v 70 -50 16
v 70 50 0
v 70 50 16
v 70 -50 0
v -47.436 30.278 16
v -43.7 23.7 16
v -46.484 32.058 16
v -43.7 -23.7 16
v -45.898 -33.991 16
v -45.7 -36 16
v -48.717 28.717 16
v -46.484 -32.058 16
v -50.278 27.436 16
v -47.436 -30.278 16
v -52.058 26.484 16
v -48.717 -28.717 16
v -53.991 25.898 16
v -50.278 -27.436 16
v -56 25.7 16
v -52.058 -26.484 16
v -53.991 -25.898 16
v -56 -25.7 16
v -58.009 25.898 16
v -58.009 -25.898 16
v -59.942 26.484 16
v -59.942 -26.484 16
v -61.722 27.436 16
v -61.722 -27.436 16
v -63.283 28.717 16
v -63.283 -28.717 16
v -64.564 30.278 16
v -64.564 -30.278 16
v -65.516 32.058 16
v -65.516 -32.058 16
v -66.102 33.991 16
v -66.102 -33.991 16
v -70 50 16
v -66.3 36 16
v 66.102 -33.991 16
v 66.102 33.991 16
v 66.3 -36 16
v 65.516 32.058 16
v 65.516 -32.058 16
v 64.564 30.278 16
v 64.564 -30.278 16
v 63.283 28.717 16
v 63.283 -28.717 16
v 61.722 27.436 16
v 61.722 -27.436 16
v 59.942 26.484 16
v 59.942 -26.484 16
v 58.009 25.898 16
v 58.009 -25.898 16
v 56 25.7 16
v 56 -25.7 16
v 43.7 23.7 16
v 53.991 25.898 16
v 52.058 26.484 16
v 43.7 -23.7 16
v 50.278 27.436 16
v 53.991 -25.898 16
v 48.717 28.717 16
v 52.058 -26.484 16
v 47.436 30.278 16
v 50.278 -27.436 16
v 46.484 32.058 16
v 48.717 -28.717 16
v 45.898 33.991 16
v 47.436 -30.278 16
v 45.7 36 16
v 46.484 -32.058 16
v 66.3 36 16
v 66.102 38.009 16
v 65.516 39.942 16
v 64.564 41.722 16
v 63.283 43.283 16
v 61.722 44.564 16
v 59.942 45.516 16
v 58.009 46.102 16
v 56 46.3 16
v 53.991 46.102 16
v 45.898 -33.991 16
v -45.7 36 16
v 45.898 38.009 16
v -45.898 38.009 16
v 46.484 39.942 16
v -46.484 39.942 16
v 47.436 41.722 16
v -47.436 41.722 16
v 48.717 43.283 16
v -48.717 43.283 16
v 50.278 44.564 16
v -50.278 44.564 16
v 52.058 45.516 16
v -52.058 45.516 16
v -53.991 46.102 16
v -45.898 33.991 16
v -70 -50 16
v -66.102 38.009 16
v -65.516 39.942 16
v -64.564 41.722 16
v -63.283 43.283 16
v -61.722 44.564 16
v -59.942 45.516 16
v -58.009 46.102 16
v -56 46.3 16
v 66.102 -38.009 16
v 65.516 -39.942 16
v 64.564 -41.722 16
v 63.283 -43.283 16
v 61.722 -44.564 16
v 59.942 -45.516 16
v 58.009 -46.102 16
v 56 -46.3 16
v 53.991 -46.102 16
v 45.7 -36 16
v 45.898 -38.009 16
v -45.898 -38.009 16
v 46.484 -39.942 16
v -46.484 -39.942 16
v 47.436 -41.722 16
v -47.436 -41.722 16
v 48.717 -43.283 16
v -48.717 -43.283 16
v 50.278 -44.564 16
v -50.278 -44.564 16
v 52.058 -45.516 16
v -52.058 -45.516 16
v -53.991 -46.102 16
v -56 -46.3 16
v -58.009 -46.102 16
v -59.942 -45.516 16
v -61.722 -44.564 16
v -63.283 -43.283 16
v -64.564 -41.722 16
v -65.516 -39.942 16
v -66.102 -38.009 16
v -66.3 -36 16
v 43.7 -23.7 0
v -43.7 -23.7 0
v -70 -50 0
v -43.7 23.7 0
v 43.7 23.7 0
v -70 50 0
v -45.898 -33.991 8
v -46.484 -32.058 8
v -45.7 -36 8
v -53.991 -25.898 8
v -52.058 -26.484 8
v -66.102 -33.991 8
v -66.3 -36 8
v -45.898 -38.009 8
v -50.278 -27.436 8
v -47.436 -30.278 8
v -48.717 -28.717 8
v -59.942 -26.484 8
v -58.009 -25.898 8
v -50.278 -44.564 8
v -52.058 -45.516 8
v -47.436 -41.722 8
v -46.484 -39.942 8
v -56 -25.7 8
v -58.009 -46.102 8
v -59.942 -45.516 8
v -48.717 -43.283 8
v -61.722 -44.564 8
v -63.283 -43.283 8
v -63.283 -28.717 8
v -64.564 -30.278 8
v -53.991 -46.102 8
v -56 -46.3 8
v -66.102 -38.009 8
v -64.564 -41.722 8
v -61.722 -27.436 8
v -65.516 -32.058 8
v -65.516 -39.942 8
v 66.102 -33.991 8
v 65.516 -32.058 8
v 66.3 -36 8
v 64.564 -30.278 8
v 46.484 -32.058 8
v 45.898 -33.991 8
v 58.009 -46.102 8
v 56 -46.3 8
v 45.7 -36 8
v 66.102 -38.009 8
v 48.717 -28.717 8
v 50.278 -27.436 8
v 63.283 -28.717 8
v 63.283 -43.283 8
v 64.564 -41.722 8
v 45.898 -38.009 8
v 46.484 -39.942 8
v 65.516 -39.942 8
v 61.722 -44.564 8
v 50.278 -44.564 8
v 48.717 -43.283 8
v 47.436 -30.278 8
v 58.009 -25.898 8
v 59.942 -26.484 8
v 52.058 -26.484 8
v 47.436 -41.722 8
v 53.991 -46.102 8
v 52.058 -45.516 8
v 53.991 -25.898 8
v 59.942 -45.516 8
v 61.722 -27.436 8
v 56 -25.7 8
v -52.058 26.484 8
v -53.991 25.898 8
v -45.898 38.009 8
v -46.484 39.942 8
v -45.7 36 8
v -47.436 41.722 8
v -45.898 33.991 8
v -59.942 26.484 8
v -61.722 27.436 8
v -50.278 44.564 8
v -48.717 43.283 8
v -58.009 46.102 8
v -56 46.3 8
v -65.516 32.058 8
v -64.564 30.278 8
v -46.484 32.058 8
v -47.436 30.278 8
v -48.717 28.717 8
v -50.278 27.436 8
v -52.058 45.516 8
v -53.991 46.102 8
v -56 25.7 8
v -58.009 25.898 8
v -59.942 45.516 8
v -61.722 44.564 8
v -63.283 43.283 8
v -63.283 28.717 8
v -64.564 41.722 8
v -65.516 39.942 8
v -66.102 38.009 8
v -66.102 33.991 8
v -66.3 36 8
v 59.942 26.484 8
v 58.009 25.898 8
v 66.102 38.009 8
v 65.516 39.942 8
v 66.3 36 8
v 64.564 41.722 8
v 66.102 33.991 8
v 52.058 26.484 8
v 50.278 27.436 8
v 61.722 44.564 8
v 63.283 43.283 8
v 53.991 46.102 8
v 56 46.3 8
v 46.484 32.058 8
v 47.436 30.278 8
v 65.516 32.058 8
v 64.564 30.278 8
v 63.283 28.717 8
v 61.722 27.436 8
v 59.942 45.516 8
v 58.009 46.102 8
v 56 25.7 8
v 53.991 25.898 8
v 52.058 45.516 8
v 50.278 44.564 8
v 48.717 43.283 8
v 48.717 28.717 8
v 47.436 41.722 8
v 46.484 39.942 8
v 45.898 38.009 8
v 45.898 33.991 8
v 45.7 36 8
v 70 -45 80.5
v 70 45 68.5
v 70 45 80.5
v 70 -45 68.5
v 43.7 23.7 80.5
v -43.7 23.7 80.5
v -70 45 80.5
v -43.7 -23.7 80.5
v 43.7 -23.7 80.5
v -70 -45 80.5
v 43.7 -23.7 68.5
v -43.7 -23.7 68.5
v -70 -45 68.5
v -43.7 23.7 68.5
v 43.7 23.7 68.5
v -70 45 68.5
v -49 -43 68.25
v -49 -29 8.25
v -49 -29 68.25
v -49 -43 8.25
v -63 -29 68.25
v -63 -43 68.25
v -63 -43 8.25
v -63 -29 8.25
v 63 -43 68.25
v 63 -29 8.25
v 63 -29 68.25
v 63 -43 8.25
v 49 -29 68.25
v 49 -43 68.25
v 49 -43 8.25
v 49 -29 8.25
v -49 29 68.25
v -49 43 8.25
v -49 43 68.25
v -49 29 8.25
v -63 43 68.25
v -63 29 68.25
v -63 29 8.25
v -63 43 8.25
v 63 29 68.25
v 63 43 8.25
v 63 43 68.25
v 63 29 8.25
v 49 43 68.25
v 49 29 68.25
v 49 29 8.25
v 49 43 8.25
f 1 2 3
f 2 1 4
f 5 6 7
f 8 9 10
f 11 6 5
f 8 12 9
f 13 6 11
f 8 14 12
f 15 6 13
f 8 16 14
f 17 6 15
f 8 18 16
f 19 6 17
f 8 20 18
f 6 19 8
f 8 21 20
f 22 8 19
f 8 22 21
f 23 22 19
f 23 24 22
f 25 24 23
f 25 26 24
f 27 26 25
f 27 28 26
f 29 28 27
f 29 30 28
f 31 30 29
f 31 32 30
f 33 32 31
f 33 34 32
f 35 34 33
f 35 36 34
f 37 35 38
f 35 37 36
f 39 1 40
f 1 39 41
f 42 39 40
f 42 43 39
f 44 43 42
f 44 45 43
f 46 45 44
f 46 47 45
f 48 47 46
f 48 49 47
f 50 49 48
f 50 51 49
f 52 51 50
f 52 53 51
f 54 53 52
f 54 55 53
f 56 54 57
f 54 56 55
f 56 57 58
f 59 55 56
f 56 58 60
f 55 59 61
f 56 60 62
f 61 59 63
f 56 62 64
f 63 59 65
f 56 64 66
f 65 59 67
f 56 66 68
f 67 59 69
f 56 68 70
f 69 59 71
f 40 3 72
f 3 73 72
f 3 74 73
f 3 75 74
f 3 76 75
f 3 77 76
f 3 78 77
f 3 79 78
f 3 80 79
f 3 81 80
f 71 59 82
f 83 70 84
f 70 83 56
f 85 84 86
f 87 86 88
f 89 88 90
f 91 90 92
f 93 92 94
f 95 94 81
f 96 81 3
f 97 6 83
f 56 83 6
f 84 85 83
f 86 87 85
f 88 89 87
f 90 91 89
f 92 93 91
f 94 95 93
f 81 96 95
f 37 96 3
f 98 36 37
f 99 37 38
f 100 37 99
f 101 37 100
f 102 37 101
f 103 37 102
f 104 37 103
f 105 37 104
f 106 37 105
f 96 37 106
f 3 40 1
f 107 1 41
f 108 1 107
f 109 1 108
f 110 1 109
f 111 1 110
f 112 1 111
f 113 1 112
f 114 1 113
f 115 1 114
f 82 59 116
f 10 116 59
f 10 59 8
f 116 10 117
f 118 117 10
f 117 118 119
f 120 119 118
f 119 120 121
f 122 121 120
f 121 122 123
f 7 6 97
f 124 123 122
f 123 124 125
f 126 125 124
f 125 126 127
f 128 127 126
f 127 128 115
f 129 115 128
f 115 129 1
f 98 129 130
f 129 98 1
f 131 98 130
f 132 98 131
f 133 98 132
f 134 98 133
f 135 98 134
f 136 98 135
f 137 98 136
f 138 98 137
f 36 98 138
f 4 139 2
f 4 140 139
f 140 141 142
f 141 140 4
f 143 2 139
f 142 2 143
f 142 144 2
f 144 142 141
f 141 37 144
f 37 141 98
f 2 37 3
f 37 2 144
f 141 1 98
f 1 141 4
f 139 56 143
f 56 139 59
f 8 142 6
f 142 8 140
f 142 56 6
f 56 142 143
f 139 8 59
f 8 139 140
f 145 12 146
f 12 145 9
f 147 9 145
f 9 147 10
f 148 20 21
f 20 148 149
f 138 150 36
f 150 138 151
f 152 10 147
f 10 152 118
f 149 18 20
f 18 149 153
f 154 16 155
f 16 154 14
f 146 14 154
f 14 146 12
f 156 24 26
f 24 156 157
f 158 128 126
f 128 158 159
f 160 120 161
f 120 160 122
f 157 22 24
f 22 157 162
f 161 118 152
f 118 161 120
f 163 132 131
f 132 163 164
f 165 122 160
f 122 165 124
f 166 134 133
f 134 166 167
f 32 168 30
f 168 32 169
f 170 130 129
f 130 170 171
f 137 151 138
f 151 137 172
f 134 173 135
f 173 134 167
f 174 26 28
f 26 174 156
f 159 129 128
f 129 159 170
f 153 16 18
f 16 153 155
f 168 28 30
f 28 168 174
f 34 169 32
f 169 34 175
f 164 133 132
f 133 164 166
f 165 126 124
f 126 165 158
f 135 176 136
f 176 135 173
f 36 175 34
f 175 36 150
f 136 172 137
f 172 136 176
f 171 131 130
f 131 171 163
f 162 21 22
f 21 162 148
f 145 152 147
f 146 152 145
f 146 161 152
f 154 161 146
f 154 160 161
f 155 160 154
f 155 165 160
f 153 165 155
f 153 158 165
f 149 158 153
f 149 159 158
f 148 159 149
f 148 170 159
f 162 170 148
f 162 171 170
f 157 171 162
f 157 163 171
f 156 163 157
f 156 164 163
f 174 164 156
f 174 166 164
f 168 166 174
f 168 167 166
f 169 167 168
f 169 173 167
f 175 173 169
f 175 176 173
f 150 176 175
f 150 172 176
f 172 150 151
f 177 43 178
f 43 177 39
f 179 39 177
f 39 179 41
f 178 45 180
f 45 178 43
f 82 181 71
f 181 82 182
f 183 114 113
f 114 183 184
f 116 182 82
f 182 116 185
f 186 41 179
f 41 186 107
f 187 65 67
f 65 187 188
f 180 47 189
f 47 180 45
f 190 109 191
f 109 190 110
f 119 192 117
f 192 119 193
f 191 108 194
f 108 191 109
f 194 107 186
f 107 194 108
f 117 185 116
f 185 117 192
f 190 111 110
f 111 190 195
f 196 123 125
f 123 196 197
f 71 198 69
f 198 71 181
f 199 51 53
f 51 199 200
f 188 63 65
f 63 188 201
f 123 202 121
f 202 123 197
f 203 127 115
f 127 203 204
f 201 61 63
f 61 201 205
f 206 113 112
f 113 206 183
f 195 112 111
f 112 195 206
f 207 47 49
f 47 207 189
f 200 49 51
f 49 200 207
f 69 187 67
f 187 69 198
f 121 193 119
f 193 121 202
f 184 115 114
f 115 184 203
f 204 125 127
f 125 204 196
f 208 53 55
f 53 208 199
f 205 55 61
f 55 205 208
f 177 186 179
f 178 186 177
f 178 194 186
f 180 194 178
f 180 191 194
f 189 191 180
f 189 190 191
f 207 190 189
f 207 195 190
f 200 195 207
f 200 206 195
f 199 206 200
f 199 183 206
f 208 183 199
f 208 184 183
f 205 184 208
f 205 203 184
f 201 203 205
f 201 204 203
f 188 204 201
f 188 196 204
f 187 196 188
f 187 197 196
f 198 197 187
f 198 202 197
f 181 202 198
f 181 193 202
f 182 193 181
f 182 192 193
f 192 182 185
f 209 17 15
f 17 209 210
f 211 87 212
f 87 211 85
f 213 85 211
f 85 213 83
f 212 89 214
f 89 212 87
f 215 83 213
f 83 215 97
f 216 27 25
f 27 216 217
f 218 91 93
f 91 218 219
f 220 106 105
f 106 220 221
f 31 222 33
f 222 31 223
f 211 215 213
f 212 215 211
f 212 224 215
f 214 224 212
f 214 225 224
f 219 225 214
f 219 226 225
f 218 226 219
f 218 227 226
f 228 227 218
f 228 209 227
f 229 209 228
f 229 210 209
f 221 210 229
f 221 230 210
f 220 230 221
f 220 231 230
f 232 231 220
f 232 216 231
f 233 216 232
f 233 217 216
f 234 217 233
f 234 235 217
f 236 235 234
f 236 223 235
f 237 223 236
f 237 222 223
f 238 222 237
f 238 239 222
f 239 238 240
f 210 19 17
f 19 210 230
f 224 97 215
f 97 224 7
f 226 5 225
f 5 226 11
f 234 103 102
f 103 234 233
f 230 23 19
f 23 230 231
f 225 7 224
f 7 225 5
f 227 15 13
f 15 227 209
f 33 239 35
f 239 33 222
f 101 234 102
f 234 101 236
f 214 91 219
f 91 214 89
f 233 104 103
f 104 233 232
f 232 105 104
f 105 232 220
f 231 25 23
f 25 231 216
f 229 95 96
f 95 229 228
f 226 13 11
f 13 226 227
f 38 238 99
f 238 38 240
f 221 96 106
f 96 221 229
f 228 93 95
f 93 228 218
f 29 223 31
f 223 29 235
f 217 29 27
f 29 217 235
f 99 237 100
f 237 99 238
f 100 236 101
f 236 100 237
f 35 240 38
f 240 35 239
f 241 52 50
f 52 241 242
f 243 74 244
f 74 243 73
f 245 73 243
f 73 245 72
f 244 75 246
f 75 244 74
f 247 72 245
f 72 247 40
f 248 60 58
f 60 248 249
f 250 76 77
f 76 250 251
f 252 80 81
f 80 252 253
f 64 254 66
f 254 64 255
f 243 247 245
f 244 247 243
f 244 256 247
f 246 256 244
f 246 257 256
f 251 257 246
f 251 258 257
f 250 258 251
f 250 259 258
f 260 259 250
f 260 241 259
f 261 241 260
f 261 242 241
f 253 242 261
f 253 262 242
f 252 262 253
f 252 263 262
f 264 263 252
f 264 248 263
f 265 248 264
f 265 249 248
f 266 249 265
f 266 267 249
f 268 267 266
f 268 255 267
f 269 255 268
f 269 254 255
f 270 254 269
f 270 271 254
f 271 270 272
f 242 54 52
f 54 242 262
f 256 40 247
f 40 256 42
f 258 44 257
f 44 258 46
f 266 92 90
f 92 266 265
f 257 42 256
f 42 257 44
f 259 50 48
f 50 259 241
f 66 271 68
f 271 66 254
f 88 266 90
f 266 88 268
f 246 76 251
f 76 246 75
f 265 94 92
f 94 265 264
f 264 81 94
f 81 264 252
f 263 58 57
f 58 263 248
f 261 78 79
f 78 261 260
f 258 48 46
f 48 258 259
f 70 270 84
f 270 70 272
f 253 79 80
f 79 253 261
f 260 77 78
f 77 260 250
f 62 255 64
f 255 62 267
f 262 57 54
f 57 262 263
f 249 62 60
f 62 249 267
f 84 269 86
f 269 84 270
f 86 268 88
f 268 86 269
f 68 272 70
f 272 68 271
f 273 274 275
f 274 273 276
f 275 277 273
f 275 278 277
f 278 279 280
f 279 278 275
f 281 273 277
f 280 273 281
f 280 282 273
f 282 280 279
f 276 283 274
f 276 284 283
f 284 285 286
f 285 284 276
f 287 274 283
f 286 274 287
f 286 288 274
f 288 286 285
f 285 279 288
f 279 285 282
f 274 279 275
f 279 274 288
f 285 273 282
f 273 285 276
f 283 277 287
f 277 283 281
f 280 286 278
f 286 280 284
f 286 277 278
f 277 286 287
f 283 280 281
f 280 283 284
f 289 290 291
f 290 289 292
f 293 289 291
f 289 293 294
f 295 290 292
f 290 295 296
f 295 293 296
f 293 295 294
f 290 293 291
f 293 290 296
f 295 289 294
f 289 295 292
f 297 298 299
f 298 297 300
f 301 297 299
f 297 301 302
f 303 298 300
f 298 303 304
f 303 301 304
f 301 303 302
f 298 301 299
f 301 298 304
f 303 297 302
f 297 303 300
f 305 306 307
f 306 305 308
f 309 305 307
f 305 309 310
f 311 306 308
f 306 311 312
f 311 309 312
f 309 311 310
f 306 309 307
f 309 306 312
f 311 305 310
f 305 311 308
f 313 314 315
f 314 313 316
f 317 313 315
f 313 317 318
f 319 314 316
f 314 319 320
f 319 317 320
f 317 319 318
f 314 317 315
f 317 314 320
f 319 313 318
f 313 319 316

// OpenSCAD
$fn = 32;

// ------------------------------------------------------------------------
// Frame cube: base 140 x 100 mm, posts 60 mm tall
// Every part is its own module, assembly() places every instance.
// ------------------------------------------------------------------------

// --- part 1 ---
module base_frame() {
  difference() {
    translate([-70, -50, 0]) cube([140, 100, 16]);
    translate([-43.7, -23.7, -1]) cube([87.4, 47.4, 18]);
    translate([-56, -36, 8]) cylinder(h = 9, d = 20.6);
    translate([56, -36, 8]) cylinder(h = 9, d = 20.6);
    translate([-56, 36, 8]) cylinder(h = 9, d = 20.6);
    translate([56, 36, 8]) cylinder(h = 9, d = 20.6);
  }
}

// --- part 2 ---
module corner_post() {
  translate([-7, -7, 0]) cube([14, 14, 60]);
}

// --- part 3 ---
module top_frame() {
  difference() {
    translate([-70, -45, 0]) cube([140, 90, 12]);
    translate([-43.7, -23.7, -1]) cube([87.4, 47.4, 14]);
  }
}

// --- assembly ---
module assembly() {
  color([0.80, 0.24, 0.20]) translate([0, 0, 0]) rotate([0, 0, 0]) base_frame();
  color([0.20, 0.45, 0.75]) translate([-56, -36, 8.25]) rotate([0, 0, 0]) corner_post();
  color([0.25, 0.62, 0.32]) translate([56, -36, 8.25]) rotate([0, 0, 0]) corner_post();
  color([0.92, 0.70, 0.18]) translate([-56, 36, 8.25]) rotate([0, 0, 0]) corner_post();
  color([0.58, 0.35, 0.70]) translate([56, 36, 8.25]) rotate([0, 0, 0]) corner_post();
  color([0.16, 0.66, 0.66]) translate([0, 0, 68.5]) rotate([0, 0, 0]) top_frame();
}

assembly();
